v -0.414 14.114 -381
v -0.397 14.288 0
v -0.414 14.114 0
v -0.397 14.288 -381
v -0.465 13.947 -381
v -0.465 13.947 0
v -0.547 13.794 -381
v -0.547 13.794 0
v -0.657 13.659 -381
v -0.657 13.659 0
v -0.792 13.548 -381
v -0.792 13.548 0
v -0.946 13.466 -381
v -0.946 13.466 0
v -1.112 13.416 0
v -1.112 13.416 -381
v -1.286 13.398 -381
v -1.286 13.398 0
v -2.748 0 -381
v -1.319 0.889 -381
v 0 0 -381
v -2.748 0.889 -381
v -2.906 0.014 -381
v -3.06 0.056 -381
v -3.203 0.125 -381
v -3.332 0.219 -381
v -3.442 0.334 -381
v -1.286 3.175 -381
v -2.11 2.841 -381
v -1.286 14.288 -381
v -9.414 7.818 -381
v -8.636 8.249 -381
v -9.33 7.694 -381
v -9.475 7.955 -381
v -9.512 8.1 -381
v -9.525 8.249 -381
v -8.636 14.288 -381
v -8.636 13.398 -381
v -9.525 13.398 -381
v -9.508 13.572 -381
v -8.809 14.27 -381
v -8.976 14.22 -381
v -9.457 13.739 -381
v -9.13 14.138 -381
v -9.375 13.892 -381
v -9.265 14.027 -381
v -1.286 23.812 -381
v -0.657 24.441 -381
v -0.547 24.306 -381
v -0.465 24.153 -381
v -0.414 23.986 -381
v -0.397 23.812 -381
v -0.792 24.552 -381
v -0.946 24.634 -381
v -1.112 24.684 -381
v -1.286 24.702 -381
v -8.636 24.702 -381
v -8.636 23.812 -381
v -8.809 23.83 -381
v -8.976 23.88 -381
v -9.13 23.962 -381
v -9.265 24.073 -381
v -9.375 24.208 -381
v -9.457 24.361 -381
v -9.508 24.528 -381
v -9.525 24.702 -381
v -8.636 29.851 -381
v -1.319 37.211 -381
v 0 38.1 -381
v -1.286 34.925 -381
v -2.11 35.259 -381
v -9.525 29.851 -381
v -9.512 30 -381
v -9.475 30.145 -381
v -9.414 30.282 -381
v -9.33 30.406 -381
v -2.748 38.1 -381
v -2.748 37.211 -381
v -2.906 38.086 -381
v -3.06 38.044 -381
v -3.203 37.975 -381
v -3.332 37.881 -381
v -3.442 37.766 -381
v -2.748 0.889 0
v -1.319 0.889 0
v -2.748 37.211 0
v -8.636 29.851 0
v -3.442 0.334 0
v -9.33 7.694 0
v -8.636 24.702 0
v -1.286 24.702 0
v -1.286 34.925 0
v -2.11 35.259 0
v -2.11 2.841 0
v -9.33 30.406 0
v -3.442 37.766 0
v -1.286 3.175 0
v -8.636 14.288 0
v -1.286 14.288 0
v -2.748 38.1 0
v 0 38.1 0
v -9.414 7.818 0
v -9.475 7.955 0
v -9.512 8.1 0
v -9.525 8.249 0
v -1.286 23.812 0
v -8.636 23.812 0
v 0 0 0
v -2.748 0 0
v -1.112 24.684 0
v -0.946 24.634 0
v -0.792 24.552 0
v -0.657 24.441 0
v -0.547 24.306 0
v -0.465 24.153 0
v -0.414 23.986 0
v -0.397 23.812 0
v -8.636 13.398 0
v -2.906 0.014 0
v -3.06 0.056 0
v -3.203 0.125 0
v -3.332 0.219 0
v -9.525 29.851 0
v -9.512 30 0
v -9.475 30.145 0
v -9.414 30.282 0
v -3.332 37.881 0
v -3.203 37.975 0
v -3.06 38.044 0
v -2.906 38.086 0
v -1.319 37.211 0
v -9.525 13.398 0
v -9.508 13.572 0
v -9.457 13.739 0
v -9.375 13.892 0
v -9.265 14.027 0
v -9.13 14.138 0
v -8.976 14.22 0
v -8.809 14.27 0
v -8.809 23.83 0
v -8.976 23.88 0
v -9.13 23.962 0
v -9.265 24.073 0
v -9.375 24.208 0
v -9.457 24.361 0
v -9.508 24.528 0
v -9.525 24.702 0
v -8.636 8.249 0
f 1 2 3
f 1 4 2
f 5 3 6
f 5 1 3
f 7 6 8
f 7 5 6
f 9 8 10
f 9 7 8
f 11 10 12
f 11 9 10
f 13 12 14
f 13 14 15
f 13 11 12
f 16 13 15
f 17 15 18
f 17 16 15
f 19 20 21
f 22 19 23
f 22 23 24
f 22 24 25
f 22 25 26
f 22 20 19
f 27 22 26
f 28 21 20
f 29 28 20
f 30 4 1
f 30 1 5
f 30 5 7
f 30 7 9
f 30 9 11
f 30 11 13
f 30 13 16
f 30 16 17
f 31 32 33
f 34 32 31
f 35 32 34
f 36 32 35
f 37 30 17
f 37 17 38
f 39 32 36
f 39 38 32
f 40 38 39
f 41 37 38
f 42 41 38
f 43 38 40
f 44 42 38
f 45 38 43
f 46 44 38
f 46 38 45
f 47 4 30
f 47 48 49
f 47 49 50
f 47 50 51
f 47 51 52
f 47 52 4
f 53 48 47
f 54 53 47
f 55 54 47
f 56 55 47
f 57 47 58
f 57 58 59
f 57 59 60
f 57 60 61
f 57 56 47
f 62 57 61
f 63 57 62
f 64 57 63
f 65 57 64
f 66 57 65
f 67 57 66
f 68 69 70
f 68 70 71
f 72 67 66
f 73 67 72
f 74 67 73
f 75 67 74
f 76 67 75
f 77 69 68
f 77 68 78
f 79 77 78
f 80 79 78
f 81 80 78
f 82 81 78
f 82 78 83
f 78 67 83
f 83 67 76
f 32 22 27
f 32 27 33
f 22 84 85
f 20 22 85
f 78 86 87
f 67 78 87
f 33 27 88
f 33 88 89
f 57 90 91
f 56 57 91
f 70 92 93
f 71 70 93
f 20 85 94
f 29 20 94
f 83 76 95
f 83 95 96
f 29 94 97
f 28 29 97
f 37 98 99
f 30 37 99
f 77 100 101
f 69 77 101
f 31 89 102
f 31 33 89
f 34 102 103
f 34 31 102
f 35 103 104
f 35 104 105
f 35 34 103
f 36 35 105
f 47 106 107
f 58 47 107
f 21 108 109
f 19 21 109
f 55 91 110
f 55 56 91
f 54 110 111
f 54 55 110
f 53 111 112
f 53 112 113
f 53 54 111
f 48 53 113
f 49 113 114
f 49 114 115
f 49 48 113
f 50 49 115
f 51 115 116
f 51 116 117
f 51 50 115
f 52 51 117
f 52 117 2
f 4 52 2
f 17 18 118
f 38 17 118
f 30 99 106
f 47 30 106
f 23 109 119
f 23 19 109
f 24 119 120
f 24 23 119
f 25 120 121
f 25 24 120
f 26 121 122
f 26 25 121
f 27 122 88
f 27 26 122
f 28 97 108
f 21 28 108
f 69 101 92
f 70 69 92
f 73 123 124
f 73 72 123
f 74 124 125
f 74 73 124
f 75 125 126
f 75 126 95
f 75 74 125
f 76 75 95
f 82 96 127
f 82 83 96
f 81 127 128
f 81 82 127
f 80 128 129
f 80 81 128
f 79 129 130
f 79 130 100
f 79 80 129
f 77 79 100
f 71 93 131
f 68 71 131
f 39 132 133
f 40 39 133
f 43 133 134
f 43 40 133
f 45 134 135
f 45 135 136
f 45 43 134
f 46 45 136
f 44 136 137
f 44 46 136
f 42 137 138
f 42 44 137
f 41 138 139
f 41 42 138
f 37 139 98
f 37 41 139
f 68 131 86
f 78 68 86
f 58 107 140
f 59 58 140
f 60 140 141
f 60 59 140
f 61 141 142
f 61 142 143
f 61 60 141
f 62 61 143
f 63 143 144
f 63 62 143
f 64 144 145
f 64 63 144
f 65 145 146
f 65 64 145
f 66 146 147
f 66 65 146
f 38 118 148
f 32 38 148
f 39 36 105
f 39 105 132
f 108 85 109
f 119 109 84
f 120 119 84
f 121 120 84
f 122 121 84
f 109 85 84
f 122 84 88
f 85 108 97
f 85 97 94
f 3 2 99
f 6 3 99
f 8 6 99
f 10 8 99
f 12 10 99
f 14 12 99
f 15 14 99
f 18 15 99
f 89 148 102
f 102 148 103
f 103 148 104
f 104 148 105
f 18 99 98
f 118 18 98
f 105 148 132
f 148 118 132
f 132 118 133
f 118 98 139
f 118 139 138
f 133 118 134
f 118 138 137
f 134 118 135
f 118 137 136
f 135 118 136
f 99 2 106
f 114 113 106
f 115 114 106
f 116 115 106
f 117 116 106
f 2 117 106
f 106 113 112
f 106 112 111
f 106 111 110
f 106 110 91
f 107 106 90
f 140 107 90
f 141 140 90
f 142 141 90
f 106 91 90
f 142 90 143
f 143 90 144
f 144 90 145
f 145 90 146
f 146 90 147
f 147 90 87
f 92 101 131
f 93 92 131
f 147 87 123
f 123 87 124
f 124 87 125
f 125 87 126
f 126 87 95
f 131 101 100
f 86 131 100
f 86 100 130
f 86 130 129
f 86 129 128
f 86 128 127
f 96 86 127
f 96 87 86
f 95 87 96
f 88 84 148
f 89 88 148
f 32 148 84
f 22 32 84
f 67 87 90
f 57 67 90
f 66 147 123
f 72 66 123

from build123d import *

# Parameters (mm, degrees)
EXTRUDE_THIN1_DEPTH = 381
FILLET1_R           = 0.889


with BuildPart() as part:
    # Sketch1 → Extrude-Thin1 (new body)
    with BuildSketch(Plane.XY):
        Polygon((-1.285875, 3.175), (0, 0), (-3.175, 0), (-9.525, 7.9375), (-9.525, 14.2875), (-1.285875, 14.2875), (-1.285875, 23.8125), (-9.525, 23.8125), (-9.525, 30.1625), (-3.175, 38.1), (0, 38.1), (-1.285875, 34.925), (-2.109862469, 35.258714925), (-1.319187013, 37.211), (-2.747724511, 37.211), (-8.636, 29.850655638), (-8.636, 24.7015), (-0.396875, 24.7015), (-0.396875, 13.3985), (-8.636, 13.3985), (-8.636, 8.249344362), (-2.747724511, 0.889), (-1.319187013, 0.889), (-2.109862469, 2.841285075), align=None)
    extrude(amount=-EXTRUDE_THIN1_DEPTH)

    # Fillet1
    fillet1_edges = [part.edges().sort_by_distance(p)[0] for p in [
        (-3.175, 0, -190.5),
        (-9.525, 7.9375, -190.5),
        (-9.525, 14.2875, -190.5),
        (-9.525, 23.8125, -190.5),
        (-9.525, 30.1625, -190.5),
        (-3.175, 38.1, -190.5),
        (-0.396875, 24.7015, -190.5),
        (-0.396875, 13.3985, -190.5),
    ]]
    fillet(fillet1_edges, radius=FILLET1_R)


solid = part.part
